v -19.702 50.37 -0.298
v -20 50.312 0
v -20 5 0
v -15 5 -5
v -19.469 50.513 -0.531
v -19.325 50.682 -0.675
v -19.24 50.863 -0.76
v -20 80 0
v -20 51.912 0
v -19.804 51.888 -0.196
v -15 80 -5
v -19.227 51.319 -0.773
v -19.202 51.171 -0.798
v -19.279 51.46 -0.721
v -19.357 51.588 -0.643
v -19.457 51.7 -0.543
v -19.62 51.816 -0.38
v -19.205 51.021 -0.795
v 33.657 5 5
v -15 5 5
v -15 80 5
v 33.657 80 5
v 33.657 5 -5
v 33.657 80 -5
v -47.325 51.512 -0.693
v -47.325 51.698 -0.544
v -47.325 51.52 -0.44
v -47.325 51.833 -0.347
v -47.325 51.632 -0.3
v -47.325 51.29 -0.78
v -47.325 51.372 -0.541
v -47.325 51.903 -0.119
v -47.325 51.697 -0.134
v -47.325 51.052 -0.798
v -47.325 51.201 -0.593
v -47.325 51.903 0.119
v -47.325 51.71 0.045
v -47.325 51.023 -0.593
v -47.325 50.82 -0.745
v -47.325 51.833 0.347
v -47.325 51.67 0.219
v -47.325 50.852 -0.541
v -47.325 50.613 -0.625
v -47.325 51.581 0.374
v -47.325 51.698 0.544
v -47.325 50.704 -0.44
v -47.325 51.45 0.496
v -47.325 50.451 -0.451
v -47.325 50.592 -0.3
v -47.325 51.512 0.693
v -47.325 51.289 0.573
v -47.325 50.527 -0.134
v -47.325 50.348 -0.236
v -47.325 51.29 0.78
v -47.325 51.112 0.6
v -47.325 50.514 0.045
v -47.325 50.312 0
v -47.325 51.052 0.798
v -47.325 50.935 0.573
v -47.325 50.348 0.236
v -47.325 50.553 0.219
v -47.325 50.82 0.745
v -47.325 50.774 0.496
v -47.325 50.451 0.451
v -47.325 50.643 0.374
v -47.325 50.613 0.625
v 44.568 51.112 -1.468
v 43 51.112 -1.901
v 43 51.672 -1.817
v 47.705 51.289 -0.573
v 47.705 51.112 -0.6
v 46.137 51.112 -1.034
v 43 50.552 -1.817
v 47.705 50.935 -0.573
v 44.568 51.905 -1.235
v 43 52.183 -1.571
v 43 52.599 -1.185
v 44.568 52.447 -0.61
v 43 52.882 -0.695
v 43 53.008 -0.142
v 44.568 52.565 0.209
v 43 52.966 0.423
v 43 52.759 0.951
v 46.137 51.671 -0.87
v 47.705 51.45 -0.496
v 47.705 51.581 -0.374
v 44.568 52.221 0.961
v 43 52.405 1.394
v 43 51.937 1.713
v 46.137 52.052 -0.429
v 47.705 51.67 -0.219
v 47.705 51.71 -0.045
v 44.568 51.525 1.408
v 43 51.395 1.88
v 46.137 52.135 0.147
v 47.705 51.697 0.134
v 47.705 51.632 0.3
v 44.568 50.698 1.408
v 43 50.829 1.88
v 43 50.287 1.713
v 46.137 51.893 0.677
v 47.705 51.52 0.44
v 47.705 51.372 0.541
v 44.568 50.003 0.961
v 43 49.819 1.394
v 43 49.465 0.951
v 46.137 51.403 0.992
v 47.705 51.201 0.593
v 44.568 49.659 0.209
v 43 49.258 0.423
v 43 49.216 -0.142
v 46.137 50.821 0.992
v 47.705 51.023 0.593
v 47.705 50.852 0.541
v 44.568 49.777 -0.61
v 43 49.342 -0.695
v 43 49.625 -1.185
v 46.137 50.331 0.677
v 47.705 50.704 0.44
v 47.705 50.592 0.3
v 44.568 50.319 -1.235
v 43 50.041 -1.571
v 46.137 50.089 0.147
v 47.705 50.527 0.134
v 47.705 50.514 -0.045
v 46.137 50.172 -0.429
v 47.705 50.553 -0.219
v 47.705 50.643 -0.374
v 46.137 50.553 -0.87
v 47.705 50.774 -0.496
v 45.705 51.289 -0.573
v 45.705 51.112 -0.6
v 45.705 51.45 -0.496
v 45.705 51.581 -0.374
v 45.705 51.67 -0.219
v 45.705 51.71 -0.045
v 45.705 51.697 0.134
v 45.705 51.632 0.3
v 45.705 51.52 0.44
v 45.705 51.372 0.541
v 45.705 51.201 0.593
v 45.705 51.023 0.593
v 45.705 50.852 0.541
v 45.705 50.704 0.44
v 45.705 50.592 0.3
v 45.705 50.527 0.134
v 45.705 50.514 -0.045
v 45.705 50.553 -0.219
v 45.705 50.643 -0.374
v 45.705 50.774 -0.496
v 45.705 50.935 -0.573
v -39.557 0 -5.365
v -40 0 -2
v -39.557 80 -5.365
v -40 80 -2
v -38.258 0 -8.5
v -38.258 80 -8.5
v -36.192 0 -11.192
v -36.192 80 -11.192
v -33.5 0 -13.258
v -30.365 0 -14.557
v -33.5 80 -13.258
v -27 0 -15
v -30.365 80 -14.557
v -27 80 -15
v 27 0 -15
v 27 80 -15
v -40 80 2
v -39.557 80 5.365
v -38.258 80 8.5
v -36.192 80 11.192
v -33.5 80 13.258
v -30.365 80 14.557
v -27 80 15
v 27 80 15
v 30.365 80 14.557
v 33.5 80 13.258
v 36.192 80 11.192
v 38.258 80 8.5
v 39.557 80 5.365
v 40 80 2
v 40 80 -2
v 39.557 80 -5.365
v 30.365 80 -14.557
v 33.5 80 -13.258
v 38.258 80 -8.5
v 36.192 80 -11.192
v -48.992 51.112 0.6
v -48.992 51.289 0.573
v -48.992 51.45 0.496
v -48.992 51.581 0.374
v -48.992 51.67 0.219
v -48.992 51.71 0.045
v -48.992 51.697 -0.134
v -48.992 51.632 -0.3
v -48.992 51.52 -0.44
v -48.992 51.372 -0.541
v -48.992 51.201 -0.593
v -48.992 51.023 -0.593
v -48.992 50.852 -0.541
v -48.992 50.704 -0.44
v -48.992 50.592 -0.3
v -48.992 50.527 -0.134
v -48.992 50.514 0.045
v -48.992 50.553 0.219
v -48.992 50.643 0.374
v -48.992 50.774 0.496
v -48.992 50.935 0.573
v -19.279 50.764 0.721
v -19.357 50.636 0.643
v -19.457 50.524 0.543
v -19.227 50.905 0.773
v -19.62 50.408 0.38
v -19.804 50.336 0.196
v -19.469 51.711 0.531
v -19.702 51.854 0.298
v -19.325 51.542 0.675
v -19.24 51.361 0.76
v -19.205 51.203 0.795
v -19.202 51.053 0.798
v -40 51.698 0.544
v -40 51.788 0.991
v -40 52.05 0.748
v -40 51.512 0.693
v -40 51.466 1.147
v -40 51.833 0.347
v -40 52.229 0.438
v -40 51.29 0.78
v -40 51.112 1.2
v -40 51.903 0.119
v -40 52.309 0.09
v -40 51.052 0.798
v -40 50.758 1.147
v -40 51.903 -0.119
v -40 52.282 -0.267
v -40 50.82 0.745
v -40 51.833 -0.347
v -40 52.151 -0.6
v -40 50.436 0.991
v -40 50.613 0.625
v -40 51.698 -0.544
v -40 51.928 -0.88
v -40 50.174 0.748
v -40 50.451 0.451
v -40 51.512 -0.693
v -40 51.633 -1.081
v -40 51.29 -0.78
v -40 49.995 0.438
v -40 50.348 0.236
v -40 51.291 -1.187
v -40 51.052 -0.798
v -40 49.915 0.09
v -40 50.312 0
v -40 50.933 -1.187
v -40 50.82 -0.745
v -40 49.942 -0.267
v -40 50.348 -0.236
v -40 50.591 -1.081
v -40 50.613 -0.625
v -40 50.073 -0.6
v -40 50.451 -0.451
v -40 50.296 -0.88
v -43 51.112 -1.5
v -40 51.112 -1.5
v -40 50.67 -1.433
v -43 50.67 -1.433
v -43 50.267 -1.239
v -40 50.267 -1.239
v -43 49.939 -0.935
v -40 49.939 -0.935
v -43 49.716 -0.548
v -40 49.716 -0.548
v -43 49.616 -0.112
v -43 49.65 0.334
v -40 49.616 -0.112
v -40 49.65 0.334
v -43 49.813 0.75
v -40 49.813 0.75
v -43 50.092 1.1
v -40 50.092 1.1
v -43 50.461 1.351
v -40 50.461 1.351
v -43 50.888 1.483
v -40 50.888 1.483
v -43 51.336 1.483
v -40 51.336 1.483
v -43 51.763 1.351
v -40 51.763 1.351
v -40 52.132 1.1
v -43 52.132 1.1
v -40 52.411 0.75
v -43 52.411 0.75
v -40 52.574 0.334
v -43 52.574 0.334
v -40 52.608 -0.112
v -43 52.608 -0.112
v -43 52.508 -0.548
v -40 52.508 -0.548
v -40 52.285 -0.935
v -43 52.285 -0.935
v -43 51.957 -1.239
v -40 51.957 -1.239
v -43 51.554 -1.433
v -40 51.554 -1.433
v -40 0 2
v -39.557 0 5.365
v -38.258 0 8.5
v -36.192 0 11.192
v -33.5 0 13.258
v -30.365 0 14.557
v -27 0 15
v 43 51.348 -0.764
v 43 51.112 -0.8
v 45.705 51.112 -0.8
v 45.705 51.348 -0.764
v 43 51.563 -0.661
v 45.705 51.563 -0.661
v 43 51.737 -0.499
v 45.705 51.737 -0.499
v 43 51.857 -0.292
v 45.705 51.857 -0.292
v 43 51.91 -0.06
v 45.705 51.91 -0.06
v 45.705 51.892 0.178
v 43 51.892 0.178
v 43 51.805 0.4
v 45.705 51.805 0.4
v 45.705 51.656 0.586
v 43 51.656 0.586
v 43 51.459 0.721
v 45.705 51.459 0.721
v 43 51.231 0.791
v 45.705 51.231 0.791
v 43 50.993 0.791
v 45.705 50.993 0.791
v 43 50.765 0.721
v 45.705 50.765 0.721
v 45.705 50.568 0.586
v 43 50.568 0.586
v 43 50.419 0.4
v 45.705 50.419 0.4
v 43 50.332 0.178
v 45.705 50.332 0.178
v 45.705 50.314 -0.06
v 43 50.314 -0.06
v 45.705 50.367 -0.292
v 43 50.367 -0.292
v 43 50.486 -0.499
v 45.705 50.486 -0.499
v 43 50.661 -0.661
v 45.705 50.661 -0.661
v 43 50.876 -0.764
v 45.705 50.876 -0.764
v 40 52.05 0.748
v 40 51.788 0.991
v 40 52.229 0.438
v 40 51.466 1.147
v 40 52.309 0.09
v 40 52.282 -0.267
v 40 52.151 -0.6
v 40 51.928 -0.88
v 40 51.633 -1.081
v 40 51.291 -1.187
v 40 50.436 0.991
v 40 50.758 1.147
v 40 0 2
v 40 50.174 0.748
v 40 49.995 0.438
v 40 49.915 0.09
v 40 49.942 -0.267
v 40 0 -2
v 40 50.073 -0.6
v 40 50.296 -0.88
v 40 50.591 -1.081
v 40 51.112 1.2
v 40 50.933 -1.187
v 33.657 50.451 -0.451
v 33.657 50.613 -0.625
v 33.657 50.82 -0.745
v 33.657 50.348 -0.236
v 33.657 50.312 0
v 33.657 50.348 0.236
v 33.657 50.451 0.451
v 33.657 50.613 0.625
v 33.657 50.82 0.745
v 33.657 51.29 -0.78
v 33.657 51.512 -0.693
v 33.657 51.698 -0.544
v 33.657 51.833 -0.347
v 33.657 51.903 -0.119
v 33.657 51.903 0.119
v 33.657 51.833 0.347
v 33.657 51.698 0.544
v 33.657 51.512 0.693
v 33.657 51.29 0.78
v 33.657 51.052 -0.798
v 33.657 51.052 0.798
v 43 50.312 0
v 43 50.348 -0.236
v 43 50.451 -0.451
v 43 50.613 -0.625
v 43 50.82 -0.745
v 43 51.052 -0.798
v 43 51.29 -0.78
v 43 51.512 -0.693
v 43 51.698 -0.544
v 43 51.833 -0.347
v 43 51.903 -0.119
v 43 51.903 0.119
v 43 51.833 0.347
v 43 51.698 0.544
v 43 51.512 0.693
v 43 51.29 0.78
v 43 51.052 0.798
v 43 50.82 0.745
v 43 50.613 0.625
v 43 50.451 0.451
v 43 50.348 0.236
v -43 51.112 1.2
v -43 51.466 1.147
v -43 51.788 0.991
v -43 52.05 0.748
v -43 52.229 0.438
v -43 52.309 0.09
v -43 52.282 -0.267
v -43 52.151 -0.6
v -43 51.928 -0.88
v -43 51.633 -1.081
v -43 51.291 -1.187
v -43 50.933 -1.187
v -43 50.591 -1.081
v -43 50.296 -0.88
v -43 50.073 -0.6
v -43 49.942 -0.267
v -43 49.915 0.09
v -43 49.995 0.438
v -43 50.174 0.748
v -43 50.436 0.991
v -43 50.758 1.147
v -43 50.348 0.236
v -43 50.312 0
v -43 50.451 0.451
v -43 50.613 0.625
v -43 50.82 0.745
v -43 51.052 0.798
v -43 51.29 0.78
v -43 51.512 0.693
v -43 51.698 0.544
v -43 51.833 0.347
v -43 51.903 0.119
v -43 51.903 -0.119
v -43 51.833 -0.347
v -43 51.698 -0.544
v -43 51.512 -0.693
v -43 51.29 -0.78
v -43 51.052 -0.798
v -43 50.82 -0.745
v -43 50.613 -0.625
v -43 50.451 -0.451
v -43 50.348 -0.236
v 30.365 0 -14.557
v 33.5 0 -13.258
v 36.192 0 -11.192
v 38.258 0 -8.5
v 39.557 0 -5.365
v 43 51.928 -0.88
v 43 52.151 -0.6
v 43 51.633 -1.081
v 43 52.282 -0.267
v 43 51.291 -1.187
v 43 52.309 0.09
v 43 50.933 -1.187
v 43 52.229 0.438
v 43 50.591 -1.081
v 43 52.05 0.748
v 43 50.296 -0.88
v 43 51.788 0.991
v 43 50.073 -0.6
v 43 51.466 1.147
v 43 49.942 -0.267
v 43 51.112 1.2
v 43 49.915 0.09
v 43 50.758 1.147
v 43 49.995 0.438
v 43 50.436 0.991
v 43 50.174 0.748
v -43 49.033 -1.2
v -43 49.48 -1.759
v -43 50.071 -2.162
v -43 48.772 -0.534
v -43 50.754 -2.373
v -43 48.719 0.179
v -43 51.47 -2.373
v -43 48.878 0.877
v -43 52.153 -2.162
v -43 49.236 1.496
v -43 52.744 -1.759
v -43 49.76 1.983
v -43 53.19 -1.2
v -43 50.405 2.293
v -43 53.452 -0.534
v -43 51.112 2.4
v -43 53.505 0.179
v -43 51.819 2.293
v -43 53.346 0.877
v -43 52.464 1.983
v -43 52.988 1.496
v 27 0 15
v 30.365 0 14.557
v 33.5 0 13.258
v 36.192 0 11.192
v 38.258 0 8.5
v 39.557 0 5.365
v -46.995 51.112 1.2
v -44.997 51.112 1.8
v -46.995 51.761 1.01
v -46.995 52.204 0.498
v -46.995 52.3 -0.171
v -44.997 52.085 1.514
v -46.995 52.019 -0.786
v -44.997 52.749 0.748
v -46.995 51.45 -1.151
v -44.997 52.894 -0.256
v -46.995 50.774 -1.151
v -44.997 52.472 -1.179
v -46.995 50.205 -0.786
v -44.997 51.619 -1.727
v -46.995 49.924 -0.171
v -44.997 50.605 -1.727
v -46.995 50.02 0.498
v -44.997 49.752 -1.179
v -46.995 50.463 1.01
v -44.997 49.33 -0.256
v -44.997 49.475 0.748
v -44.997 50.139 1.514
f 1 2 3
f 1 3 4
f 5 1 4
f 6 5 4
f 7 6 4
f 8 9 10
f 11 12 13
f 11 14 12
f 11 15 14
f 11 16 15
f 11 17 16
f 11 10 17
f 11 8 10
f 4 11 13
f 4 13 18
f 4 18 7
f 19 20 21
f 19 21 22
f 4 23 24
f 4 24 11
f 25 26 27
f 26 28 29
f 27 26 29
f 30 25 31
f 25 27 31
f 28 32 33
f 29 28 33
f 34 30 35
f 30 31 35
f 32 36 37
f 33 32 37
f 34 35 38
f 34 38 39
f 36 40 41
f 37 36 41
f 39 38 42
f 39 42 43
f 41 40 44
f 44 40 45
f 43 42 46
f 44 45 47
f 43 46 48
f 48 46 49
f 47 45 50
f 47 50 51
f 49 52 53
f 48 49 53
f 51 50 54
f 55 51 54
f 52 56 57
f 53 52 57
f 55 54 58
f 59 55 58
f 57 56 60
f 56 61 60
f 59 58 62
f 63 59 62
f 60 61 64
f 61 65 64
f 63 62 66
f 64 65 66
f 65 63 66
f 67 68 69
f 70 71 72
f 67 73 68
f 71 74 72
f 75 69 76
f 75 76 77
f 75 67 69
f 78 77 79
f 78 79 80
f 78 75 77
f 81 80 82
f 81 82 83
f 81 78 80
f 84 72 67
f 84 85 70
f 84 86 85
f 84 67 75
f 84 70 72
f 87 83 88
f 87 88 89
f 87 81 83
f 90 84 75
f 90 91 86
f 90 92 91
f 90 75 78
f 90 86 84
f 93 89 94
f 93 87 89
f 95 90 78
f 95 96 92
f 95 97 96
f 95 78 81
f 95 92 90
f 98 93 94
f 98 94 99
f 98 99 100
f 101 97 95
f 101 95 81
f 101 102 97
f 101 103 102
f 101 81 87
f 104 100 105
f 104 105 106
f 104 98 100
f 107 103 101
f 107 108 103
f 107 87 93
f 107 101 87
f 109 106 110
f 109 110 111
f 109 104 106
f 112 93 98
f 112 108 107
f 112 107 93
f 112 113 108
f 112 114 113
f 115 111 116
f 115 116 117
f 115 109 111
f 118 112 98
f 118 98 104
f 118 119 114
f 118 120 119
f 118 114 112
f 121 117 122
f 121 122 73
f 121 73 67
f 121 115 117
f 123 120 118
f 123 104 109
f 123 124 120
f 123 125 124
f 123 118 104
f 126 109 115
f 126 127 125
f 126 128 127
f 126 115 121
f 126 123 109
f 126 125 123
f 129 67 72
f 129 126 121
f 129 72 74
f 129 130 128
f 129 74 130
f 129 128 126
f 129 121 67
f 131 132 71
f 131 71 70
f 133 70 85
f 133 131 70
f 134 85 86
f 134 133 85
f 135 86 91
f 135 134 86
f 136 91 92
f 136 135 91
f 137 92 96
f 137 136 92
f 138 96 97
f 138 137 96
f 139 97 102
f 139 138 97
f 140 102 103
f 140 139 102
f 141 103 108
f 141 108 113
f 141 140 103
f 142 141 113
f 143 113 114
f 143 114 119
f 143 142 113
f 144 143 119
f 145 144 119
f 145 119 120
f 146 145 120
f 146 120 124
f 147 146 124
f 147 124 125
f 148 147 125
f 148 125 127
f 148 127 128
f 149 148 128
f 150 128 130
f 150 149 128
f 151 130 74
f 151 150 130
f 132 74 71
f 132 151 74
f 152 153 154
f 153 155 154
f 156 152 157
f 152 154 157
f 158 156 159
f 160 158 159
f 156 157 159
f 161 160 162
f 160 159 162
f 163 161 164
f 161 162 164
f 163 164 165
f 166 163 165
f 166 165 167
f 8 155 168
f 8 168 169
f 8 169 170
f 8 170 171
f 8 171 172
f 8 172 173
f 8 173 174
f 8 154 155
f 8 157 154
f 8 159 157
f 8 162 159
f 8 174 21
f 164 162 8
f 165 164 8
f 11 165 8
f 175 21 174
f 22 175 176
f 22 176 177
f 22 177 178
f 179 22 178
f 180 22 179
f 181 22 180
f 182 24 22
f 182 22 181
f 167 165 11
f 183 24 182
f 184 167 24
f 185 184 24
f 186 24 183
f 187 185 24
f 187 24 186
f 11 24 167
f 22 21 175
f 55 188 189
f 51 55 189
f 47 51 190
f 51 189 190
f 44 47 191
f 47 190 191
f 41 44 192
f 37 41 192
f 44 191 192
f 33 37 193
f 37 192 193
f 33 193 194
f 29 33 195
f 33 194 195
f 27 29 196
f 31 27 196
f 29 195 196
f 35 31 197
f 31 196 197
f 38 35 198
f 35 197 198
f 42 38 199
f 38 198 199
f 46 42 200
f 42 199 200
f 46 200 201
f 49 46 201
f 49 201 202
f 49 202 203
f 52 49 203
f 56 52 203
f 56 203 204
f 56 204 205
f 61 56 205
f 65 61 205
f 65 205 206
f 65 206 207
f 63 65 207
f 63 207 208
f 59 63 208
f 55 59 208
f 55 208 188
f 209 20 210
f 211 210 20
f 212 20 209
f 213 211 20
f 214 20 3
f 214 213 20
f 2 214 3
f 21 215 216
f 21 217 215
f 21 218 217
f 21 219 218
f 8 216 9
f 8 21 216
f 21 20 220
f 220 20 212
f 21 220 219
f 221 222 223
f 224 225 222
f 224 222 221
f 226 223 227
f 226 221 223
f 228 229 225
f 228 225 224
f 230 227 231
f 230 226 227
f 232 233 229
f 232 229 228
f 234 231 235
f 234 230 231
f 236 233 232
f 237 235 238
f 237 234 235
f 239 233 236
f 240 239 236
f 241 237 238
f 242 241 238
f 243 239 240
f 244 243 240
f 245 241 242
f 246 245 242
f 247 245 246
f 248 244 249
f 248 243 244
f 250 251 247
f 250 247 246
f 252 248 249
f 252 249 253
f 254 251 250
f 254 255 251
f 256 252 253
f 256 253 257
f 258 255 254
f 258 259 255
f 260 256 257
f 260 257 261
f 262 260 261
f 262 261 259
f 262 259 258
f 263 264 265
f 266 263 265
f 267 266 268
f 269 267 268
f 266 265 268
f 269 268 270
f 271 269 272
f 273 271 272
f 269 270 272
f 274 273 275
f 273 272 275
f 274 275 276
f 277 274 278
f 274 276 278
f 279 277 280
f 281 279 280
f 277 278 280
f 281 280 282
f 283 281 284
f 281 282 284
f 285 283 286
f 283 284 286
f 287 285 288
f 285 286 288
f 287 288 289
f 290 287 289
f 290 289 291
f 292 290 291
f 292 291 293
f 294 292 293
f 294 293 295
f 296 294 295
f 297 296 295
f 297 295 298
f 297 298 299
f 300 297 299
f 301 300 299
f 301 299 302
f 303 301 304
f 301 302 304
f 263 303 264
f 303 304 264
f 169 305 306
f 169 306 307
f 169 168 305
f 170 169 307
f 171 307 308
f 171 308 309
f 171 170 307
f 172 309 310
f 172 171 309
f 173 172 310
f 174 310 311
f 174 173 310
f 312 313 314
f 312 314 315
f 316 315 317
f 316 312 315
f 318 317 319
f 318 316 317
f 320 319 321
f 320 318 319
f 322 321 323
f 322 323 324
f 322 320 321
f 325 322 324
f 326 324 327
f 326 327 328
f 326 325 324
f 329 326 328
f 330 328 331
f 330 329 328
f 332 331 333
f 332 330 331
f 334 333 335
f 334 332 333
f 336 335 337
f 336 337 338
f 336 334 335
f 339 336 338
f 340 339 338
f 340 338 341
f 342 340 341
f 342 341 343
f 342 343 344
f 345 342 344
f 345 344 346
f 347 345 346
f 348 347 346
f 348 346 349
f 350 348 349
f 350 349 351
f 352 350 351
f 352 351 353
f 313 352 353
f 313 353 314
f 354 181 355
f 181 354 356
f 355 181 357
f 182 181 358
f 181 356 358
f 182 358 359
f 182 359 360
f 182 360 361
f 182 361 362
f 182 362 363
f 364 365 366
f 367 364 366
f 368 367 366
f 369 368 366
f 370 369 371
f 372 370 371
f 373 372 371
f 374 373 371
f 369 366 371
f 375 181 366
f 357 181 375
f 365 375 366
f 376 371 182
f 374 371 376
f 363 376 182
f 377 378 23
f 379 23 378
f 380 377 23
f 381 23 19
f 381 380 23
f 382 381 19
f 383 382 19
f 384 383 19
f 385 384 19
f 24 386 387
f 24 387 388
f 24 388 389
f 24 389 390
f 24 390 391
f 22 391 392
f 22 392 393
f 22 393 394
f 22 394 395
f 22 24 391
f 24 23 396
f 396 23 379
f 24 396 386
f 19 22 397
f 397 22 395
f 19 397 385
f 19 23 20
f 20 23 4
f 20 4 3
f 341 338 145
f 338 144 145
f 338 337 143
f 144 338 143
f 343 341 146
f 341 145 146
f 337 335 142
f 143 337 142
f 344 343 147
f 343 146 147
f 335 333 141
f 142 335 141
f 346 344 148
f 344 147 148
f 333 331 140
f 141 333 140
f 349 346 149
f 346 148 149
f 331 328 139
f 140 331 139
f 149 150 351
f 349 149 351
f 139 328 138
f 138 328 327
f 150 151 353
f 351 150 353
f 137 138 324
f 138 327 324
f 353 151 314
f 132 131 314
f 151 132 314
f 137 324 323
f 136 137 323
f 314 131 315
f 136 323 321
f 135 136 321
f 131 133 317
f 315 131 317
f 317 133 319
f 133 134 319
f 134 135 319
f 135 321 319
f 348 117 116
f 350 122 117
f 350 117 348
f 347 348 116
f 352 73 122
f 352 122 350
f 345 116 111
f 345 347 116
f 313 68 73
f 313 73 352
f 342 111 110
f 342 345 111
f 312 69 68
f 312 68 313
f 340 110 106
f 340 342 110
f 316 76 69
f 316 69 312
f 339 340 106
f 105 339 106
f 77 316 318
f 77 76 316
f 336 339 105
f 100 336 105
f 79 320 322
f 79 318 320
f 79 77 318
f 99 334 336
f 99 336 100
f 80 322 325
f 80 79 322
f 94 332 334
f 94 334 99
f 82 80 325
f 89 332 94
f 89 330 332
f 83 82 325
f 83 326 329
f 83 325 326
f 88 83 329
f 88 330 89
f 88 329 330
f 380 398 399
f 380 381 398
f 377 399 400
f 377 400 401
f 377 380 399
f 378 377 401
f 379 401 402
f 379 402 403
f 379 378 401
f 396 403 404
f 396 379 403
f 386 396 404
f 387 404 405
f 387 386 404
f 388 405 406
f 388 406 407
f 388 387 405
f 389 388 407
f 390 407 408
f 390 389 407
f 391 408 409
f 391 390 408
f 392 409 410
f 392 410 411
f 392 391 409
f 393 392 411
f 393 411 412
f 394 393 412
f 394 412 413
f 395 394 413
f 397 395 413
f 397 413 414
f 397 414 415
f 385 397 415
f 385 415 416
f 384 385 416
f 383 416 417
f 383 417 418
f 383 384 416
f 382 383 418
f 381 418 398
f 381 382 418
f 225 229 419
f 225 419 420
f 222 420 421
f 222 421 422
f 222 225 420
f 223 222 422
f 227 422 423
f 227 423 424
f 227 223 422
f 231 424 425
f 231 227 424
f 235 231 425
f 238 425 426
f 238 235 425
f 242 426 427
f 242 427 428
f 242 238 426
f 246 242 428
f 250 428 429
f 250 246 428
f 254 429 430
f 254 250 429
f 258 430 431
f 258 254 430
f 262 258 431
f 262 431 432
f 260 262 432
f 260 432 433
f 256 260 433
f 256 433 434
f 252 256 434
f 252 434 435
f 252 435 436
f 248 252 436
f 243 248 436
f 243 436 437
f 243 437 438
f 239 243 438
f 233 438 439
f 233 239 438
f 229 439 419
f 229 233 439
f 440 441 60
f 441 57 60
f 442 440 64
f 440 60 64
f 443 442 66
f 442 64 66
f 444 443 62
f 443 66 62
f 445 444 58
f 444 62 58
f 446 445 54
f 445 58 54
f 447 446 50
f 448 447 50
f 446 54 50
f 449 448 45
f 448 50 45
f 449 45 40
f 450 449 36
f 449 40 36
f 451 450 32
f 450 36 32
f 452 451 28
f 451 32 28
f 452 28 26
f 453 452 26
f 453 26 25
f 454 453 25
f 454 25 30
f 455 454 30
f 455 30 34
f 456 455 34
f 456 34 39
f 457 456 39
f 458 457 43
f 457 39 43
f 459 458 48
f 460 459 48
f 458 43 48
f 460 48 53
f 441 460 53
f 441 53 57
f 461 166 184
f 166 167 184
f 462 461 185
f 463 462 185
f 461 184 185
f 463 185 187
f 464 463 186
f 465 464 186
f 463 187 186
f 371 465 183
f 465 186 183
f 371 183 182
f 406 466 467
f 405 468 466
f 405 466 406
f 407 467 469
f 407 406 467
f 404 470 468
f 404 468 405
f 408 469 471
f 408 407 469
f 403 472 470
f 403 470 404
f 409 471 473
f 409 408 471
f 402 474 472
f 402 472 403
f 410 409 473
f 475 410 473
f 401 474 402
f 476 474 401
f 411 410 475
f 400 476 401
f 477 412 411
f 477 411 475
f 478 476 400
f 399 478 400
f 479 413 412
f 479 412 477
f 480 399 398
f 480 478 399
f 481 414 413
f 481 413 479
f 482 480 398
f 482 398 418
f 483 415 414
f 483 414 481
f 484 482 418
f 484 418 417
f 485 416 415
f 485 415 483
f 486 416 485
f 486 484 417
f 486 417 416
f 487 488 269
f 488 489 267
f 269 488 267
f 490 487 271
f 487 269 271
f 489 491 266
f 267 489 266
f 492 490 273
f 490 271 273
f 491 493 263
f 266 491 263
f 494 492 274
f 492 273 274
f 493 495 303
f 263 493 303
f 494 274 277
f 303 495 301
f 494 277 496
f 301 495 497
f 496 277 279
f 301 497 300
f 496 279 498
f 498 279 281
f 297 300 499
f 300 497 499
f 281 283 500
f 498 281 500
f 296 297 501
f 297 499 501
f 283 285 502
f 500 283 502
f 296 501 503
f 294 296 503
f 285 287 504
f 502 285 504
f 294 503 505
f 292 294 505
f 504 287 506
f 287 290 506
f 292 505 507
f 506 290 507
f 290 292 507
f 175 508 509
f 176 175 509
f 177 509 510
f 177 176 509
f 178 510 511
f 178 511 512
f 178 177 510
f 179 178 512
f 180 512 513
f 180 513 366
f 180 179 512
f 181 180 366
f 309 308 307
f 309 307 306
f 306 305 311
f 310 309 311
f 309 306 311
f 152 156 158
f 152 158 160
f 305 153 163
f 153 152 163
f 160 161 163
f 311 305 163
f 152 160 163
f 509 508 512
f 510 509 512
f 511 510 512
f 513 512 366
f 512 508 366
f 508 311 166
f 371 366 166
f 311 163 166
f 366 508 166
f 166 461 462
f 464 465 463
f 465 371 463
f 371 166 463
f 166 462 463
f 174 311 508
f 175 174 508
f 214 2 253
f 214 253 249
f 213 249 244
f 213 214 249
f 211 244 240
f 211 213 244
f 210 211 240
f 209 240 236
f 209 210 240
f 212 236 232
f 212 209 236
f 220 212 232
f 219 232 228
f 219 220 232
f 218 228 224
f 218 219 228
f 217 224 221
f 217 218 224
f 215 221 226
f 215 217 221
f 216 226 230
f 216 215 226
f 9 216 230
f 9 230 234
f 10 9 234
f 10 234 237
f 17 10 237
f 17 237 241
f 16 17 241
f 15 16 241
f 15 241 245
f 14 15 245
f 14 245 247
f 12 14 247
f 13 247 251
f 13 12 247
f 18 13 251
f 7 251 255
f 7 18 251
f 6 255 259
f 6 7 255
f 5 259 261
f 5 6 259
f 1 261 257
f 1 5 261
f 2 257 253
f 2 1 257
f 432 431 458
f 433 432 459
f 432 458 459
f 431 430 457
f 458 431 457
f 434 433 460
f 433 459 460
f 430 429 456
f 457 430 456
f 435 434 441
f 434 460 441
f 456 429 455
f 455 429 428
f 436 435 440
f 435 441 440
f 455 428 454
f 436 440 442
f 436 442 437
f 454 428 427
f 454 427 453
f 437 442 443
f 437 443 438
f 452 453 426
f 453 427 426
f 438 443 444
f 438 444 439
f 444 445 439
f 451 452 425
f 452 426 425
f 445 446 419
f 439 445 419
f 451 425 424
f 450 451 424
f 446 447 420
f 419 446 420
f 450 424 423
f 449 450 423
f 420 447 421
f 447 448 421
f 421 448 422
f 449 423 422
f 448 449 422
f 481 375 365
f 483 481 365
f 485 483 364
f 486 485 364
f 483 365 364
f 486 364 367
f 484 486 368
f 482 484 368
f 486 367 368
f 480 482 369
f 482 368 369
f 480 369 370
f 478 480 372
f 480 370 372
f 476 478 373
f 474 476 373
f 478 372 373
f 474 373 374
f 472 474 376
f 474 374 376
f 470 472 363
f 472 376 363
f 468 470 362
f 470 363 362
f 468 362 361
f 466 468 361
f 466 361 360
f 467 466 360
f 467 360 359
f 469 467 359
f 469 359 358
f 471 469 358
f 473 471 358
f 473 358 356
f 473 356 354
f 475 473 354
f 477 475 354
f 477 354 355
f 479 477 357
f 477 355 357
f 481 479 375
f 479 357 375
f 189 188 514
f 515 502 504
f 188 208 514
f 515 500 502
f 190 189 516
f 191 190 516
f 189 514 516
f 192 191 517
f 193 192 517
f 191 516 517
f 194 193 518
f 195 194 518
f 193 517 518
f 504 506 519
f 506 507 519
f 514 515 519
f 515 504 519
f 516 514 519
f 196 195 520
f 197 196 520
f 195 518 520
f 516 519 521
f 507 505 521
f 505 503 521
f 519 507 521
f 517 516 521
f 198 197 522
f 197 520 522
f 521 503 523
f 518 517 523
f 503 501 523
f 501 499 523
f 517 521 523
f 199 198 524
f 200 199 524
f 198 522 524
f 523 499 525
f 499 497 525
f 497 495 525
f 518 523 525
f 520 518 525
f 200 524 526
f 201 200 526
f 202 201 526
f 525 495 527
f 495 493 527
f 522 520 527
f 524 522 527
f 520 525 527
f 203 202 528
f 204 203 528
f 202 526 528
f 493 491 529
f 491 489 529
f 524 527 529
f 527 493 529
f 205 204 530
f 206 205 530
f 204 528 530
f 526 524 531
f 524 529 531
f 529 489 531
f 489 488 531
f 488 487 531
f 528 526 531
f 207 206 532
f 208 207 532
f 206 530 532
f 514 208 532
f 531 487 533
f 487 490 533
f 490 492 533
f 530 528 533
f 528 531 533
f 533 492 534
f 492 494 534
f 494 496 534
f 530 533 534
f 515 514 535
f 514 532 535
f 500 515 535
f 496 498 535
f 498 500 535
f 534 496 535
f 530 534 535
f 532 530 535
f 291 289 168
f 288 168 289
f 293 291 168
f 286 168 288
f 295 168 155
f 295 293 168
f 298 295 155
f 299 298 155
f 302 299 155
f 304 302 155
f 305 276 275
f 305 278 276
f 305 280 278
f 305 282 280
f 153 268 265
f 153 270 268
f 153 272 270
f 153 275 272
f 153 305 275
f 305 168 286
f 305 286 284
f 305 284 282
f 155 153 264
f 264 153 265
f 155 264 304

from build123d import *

# Parameters (mm, degrees)
SKETCH1_W               = 80
SKETCH1_H               = 30
BOSS_EXTRUDE1_DEPTH     = 80
CUT_EXTRUDE1_DEPTH      = 75
CUT_EXTRUDE2_DEPTH      = 115.127122105
CUT_EXTRUDE2_DEPTH_BACK = 115.127122105
SKETCH3_R               = 0.8
SKETCH4_R               = 1.5
SKETCH4_R_2             = 1.2
BOSS_EXTRUDE2_DEPTH     = 3
SKETCH7_R               = 0.6
CUT_EXTRUDE3_DEPTH      = 2
SKETCH8_R               = 0.8
CUT_EXTRUDE4_DEPTH      = 53
FILLET1_R               = 13
SKETCH9_R               = 1.2
SKETCH9_R_2             = 0.8
BOSS_EXTRUDE3_DEPTH     = 3
CUT_EXTRUDE5_START      = -2
SKETCH12_R              = 0.6
CUT_EXTRUDE5_DEPTH      = 2
CUT_EXTRUDE6_START      = -35
SKETCH14_R              = 0.8
CUT_EXTRUDE6_DEPTH      = 35


with BuildPart() as part:
    # Sketch1 → Boss-Extrude1 (new body)
    with BuildSketch(Plane(origin=(0, 0, 0), x_dir=(1, 0, 0), z_dir=(0, 1, 0))):
        Rectangle(SKETCH1_W, SKETCH1_H)
    extrude(amount=BOSS_EXTRUDE1_DEPTH)

    # Sketch2 → Cut-Extrude1 (cut)
    with BuildSketch(Plane(origin=(0, 80, 0), x_dir=(1, 0, 0), z_dir=(0, 1, 0))):
        Polygon((-15, 5), (15, 5), (33.657016573, 5), (33.657016573, -5), (15, -5), (-15, -5), (-20, 0), align=None)
    extrude(amount=-CUT_EXTRUDE1_DEPTH, mode=Mode.SUBTRACT)

    # Sketch3 → Cut-Extrude2 (cut, two sides: drawn at the far end of the back side and taken through both)
    with BuildSketch(Plane.ZY.offset(40).offset(-CUT_EXTRUDE2_DEPTH_BACK)):
        with Locations(Location((0, 51.111959895, 0), (0, 0, 270))):
            Circle(SKETCH3_R)
    extrude(amount=CUT_EXTRUDE2_DEPTH + CUT_EXTRUDE2_DEPTH_BACK, mode=Mode.SUBTRACT)

    # Sketch4 → Boss-Extrude2 (add)
    with BuildSketch(Plane.ZY.offset(40)):
        with Locations(Location((0, 51.111959895, 0), (0, 0, 180))):
            Circle(SKETCH4_R)
        with Locations((0, 51.111959895)):
            Circle(SKETCH4_R_2, mode=Mode.SUBTRACT)
    extrude(amount=BOSS_EXTRUDE2_DEPTH)

    # Sketch6 → Revolve1 (revolve)
    with BuildSketch(Plane.XY, mode=Mode.PRIVATE) as revolve1_sk:
        Polygon((-43, 51.111959895), (-49.325220868, 51.111959895), (-49.325220868, 51.611959895), (-43, 53.511959895), align=None)
    revolve(revolve1_sk.sketch.rotate(Axis((-43, 51.111959895, 0), (-1, 0, 0)), 270), axis=Axis((-43, 51.111959895, 0), (-1, 0, 0)))

    # Sketch7 → Cut-Extrude3 (cut)
    with BuildSketch(Plane.ZY.offset(49.325220868)):
        with Locations((0, 51.111959895)):
            Circle(SKETCH7_R)
    extrude(amount=-CUT_EXTRUDE3_DEPTH, mode=Mode.SUBTRACT)

    # Sketch8 → Cut-Extrude4 (cut)
    with BuildSketch(Plane.ZY.offset(47.325220868)):
        with Locations(Location((0, 51.111959895, 0), (0, 0, 270))):
            Circle(SKETCH8_R)
    extrude(amount=-CUT_EXTRUDE4_DEPTH, mode=Mode.SUBTRACT)

    # Fillet1
    fillet1_edges = [part.edges().sort_by_distance(p)[0] for p in [
        (40, 40, 15),
        (-40, 40, 15),
        (-40, 40, -15),
        (40, 40, -15),
    ]]
    fillet(fillet1_edges, radius=FILLET1_R)

    # Sketch9 → Boss-Extrude3 (add)
    with BuildSketch(Plane(origin=(40, 0, 0), x_dir=(0, 0, -1), z_dir=(1, 0, 0))):
        with Locations(Location((0, 51.111959895, 0), (0, 0, 180))):
            Circle(SKETCH9_R)
        with Locations(Location((0, 51.111959895, 0), (0, 0, 270))):
            Circle(SKETCH9_R_2, mode=Mode.SUBTRACT)
    extrude(amount=BOSS_EXTRUDE3_DEPTH)


with BuildPart() as body_2:
    # Sketch11 → Revolve2 (revolve)
    with BuildSketch(Plane.XY, mode=Mode.PRIVATE) as revolve2_sk:
        Polygon((43, 51.111959895), (43, 53.013316413), (47.705149283, 51.711959895), (47.705149283, 51.111959895), align=None)
    revolve(revolve2_sk.sketch.rotate(Axis((43, 51.111959895, 0), (1, 0, 0)), 270), axis=Axis((43, 51.111959895, 0), (1, 0, 0)))

    # Sketch12 → Cut-Extrude5 (cut)
    with BuildSketch(Plane(origin=(47.705149283, 0, 0), x_dir=(0, 0, -1), z_dir=(1, 0, 0)).offset(CUT_EXTRUDE5_START)):
        with Locations((0, 51.111959895)):
            Circle(SKETCH12_R)
    extrude(amount=CUT_EXTRUDE5_DEPTH, mode=Mode.SUBTRACT)

    # Sketch14 → Cut-Extrude6 (cut)
    with BuildSketch(Plane(origin=(45.705149283, 0, 0), x_dir=(0, 0, -1), z_dir=(1, 0, 0)).offset(CUT_EXTRUDE6_START)):
        with Locations((0, 51.111959895)):
            Circle(SKETCH14_R)
    extrude(amount=CUT_EXTRUDE6_DEPTH, mode=Mode.SUBTRACT)


solid = Compound([part.part, body_2.part])
